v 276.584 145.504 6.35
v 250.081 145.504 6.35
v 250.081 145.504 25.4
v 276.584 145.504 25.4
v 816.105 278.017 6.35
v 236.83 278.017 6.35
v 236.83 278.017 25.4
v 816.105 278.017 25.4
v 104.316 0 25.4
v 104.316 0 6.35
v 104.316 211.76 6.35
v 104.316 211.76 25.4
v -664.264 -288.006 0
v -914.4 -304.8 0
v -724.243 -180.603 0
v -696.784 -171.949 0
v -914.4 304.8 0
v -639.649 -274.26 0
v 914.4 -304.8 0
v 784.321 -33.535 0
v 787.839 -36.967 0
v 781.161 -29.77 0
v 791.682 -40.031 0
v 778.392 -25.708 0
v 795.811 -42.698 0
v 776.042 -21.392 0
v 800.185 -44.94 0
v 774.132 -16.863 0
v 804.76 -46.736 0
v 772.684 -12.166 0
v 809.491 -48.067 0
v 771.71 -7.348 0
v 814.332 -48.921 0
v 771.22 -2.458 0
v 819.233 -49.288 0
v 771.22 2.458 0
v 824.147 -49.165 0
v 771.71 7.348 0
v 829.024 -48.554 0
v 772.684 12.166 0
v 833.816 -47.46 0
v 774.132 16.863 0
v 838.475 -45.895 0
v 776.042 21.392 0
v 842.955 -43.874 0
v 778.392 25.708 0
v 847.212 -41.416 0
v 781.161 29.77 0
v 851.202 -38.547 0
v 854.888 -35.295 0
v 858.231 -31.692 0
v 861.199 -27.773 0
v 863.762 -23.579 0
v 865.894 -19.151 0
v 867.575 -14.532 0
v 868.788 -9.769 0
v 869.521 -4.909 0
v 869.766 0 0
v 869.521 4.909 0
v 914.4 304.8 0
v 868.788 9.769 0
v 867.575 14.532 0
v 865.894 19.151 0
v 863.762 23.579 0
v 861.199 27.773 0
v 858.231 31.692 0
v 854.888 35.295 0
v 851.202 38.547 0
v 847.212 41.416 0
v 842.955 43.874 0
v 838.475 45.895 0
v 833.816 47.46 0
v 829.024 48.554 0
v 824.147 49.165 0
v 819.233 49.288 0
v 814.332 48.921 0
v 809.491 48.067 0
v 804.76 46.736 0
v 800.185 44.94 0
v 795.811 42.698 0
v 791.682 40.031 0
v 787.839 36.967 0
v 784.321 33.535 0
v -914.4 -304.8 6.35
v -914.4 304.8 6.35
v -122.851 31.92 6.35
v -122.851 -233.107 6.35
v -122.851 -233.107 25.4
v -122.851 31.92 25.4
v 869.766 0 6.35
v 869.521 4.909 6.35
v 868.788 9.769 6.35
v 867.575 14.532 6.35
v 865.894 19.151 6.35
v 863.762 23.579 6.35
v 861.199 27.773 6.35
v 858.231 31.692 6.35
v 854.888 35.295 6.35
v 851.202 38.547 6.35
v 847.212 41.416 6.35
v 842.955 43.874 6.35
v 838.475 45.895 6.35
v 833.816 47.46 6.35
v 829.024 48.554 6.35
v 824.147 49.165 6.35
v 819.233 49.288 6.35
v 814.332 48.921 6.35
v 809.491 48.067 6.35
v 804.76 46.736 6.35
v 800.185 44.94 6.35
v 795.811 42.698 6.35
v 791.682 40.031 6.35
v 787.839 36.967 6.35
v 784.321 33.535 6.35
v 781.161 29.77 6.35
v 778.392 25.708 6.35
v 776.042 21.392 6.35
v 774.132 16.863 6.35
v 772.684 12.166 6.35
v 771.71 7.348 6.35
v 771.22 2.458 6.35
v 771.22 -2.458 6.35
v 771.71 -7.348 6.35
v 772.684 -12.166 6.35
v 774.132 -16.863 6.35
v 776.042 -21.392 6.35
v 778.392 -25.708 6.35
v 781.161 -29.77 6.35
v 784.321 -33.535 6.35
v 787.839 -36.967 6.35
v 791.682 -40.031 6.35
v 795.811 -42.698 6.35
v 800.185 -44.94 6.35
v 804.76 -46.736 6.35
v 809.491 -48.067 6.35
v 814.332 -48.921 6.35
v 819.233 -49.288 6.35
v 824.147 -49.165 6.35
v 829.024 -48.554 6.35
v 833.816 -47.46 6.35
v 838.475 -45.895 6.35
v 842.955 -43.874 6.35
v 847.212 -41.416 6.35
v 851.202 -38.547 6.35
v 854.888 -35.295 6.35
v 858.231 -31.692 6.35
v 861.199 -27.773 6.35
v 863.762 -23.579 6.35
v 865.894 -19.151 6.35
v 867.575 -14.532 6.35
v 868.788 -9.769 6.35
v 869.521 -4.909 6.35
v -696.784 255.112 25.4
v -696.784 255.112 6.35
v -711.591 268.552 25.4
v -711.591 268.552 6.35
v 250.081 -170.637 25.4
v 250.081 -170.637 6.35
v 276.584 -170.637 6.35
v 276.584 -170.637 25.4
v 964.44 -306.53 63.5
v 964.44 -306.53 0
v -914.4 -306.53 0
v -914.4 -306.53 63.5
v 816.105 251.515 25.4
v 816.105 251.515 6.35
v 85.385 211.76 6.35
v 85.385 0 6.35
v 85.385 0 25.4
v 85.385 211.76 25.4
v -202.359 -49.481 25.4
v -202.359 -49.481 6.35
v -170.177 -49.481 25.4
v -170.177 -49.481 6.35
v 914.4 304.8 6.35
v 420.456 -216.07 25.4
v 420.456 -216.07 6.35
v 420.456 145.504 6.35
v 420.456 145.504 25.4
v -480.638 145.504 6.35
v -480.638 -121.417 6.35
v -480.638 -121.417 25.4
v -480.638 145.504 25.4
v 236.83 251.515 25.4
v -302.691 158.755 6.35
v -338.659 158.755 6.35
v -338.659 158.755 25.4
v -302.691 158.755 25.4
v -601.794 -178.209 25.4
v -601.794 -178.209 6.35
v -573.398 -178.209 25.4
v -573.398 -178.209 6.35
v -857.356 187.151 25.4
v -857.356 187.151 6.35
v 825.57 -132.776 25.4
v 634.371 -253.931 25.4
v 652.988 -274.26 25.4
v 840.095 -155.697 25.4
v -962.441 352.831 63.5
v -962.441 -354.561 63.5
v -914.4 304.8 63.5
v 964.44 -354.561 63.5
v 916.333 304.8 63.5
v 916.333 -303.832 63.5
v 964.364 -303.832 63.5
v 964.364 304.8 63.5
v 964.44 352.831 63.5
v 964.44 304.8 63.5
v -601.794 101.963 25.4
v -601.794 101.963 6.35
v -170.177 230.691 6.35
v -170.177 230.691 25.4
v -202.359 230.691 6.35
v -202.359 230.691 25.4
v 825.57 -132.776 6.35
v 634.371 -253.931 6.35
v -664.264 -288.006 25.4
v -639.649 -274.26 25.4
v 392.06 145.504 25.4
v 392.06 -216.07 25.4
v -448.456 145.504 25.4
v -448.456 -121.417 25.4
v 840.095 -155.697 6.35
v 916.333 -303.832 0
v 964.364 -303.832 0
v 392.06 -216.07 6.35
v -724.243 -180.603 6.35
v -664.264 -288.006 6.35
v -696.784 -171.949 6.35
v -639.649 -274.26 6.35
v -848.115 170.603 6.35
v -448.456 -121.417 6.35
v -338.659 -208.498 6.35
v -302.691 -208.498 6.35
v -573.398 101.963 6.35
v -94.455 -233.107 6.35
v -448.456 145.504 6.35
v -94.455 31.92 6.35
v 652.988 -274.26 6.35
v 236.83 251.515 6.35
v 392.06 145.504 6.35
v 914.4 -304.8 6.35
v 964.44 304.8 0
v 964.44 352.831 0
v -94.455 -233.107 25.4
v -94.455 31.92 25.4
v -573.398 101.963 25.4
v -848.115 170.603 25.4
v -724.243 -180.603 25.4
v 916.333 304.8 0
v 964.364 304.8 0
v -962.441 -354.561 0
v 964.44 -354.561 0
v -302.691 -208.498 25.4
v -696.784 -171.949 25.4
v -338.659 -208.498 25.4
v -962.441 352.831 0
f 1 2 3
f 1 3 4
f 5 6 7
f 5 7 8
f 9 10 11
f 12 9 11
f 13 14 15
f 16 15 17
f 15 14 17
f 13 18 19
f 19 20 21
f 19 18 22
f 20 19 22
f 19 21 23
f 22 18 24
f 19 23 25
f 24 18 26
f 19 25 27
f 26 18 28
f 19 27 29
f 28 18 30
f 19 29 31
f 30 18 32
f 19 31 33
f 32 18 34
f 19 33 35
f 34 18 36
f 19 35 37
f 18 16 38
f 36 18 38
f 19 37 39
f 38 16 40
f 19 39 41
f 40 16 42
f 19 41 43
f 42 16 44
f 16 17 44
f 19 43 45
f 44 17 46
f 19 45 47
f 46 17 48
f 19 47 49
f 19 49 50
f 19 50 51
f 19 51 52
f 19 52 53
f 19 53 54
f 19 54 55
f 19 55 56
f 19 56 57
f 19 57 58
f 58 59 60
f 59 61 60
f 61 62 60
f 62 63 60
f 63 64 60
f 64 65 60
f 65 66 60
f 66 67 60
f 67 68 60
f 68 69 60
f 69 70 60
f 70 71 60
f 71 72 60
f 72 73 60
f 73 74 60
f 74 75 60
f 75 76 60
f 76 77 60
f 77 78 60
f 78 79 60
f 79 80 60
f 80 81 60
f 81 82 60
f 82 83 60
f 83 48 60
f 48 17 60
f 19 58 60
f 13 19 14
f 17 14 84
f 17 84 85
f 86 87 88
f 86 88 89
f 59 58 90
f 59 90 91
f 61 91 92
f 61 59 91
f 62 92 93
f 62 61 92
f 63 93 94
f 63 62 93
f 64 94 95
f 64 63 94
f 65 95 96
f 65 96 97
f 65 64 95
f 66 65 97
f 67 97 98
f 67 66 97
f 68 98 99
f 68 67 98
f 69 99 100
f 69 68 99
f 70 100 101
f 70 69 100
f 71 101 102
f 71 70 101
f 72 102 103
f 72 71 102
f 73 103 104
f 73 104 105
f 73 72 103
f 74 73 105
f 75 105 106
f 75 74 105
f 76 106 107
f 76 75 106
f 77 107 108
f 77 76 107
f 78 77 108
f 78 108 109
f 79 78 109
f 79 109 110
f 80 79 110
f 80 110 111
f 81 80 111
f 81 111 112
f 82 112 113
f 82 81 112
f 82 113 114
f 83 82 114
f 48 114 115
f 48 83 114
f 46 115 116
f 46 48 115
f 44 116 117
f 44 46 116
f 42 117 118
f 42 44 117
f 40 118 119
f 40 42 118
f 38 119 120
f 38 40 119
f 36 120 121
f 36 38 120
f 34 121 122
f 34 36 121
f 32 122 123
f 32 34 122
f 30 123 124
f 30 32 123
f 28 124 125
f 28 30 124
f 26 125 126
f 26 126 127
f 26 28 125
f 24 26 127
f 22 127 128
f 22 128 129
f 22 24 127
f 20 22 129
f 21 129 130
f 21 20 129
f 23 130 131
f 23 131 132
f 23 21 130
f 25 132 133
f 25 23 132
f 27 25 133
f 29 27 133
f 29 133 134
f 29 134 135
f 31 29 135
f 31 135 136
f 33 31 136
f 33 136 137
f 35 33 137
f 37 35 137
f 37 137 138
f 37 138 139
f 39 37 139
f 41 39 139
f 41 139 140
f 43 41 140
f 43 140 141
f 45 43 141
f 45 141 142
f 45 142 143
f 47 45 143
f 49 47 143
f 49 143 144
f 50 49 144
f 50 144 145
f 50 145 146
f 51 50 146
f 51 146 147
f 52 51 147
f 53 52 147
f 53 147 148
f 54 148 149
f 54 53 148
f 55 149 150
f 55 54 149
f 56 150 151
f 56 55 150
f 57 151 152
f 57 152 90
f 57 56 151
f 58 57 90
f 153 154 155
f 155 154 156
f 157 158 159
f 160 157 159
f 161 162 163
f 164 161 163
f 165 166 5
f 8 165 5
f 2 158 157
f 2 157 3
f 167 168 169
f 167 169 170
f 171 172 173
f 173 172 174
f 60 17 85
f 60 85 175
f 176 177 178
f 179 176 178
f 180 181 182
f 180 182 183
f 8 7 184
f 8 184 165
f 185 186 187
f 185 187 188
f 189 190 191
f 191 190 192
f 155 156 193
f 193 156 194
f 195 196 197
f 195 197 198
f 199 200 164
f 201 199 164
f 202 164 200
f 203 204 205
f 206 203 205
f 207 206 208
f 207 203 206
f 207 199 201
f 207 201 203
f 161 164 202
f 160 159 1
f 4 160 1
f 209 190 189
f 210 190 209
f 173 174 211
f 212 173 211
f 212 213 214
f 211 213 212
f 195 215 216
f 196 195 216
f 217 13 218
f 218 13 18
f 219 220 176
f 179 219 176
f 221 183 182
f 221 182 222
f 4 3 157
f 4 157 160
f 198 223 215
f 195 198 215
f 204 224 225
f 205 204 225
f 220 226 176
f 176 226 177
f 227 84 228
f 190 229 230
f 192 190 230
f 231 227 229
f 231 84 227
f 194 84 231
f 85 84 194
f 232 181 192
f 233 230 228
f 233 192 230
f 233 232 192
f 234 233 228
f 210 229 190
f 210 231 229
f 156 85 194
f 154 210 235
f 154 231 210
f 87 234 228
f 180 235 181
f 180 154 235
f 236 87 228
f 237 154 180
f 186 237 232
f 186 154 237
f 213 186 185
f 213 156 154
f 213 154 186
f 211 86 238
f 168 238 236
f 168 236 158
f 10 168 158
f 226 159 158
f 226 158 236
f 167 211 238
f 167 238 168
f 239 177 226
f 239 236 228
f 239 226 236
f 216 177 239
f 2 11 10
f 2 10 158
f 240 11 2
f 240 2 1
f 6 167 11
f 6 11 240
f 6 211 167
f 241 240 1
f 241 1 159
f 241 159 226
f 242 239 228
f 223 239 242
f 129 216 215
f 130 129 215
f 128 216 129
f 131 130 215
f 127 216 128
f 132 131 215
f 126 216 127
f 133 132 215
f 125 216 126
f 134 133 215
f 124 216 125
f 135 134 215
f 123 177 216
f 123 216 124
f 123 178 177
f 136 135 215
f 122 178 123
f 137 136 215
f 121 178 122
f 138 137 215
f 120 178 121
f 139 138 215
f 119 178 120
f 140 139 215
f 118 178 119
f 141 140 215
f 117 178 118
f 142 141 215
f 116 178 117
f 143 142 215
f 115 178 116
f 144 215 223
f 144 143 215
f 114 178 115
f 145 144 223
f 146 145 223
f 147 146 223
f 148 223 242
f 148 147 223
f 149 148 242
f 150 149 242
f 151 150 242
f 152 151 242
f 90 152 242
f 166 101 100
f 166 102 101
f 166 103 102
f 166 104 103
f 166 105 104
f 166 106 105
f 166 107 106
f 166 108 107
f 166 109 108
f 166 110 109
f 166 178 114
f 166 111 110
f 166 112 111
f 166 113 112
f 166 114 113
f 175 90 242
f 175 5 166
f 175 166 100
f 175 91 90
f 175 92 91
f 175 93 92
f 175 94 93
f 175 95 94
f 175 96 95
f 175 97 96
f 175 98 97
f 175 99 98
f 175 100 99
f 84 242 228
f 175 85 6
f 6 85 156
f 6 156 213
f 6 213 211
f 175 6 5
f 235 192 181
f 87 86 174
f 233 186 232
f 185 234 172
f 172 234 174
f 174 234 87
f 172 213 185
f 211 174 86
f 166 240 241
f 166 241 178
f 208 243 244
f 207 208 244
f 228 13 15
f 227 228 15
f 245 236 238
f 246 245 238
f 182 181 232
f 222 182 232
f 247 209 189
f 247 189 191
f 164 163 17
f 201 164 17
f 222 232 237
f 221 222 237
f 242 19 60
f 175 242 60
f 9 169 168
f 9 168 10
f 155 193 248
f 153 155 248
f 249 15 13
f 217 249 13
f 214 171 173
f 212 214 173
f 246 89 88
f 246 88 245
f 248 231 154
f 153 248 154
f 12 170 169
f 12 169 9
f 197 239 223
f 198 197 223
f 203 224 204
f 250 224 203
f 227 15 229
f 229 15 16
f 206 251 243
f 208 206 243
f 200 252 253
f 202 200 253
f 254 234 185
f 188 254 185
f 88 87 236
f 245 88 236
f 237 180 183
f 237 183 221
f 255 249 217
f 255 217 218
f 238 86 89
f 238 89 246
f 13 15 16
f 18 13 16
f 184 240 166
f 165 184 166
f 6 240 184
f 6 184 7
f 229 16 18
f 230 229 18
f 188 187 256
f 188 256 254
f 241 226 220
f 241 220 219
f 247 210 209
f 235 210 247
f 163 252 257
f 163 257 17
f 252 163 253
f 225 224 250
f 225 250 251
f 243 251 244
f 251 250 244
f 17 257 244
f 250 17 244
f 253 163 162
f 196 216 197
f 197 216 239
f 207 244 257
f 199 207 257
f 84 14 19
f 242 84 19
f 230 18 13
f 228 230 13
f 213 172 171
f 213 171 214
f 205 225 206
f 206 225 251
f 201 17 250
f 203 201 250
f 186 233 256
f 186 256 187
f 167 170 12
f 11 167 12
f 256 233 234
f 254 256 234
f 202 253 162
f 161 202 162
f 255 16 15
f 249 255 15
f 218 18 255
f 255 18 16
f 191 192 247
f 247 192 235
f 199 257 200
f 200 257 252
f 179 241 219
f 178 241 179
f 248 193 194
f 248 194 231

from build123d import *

# Parameters (mm, degrees)
F2_DEPTH = 25.4
F0_W     = 48.0314
F0_H     = 608.6317263126
F3_DEPTH = 63.5
F0_W_2   = 1828.8
F0_H_2   = 609.6
F0_W_3   = 28.3958315849
F0_H_3   = 280.1721617579
F0_H_4   = 265.0277093053
F0_W_4   = 35.9680652618
F0_H_5   = 367.2526776791
F0_W_5   = 26.5027880669
F0_H_6   = 316.140204668
F0_H_7   = 361.5735173225
F0_W_6   = 32.1819484234
F0_H_8   = 266.9207602739
F0_W_7   = 32.1819335222
F0_H_9   = 280.1721505821
F0_W_8   = 18.93055439
F0_H_10  = 211.7604613304
F0_R     = 49.3032271109
F0_W_9   = 579.2748481035
F0_H_11  = 26.5027880669
F4_DEPTH = 6.35
F5_DEPTH = 25.4
F7_DEPTH = 25.4
F8_DEPTH = 25.4


# Not quite as in the source:
# - the program builds the solid bodies; features that only make, move or delete a surface that nothing else refers to are left out


with BuildPart() as f2:
    # F0 (on Top) → F2 (new body)
    with BuildSketch(Plane.XY):
        Polygon((-724.242739406, -180.6030766776), (-664.2644405365, -288.006067276), (-639.6492631828, -274.2599280315), (-696.7837155241, -171.9494063374), align=None)
    extrude(amount=F2_DEPTH)


with BuildPart() as f3:
    # F0 (on Top) → F3 (new body)
    with BuildSketch(Plane.XY):
        Polygon((-914.4, -306.5295712601), (-914.4, -304.8), (-914.4, 304.8), (-962.4407291412, 304.8), (-962.4407291412, -306.5295712601), align=None)
        Polygon((964.4395112991, -306.5295712601), (-914.4, -306.5295712601), (-962.4407291412, -306.5295712601), (-962.4407291412, -354.5609712601), (964.4395112991, -354.5609712601), align=None)
        Polygon((-962.4407291412, 304.8), (-914.4, 304.8), (914.4, 304.8), (916.3329601288, 304.8), (964.3643601288, 304.8), (964.4395112991, 304.8), (964.4395112991, 352.8314), (-962.4407291412, 352.8314), align=None)
        with Locations((940.3486601288, 0.4841368437)):
            Rectangle(F0_W, F0_H)
    extrude(amount=F3_DEPTH)


with BuildPart() as f4:
    # F0 (on Top) → F4 (new body)
    with BuildSketch(Plane.XY):
        Rectangle(F0_W_2, F0_H_2)
        Polygon((-639.6492631828, -274.2599280315), (-664.2644405365, -288.006067276), (-724.242739406, -180.6030766776), (-696.7837155241, -171.9494063374), align=None, mode=Mode.SUBTRACT)
        with Locations((-587.59573102, -38.1228066981)):
            Rectangle(F0_W_3, F0_H_3, mode=Mode.SUBTRACT)
        with Locations((-108.6528003216, -100.5936227739)):
            Rectangle(F0_W_3, F0_H_4, mode=Mode.SUBTRACT)
        with Locations((-320.6749558449, -24.8714238405)):
            Rectangle(F0_W_4, F0_H_5, mode=Mode.SUBTRACT)
        Polygon((652.9883329754, -274.2599280315), (634.3713402748, -253.9310753345), (825.5698084831, -132.7755451202), (840.0946035245, -155.6974749573), align=None, mode=Mode.SUBTRACT)
        with Locations((263.332515955, -12.5665664673)):
            Rectangle(F0_W_5, F0_H_6, mode=Mode.SUBTRACT)
        with Locations((406.2581658363, -35.2832227945)):
            Rectangle(F0_W_3, F0_H_7, mode=Mode.SUBTRACT)
        with Locations((-464.5471423864, 12.0431557298)):
            Rectangle(F0_W_6, F0_H_8, mode=Mode.SUBTRACT)
        with Locations((-186.2680539489, 90.6049404293)):
            Rectangle(F0_W_7, F0_H_9, mode=Mode.SUBTRACT)
        Polygon((-857.3560714722, 187.1507465839), (-711.5908265114, 268.5521245003), (-696.7837155241, 255.1123515359), (-848.1149500553, 170.6026934488), align=None, mode=Mode.SUBTRACT)
        with Locations((94.8506072164, 105.8802306652)):
            Rectangle(F0_W_8, F0_H_10, mode=Mode.SUBTRACT)
        with Locations((820.462346077, 0)):
            Circle(F0_R, mode=Mode.SUBTRACT)
        with Locations((526.467166841, 264.7660076618)):
            Rectangle(F0_W_9, F0_H_11, mode=Mode.SUBTRACT)
    extrude(amount=F4_DEPTH)

    # F0 (on Top) → F5 (join)
    with BuildSketch(Plane.XY):
        with Locations((-587.59573102, -38.1228066981)):
            Rectangle(F0_W_3, F0_H_3)
        Polygon((-696.7837155241, 255.1123515359), (-711.5908265114, 268.5521245003), (-857.3560714722, 187.1507465839), (-848.1149500553, 170.6026934488), align=None)
        with Locations((-464.5471423864, 12.0431557298)):
            Rectangle(F0_W_6, F0_H_8)
        with Locations((-320.6749558449, -24.8714238405)):
            Rectangle(F0_W_4, F0_H_5)
        with Locations((-186.2680539489, 90.6049404293)):
            Rectangle(F0_W_7, F0_H_9)
        with Locations((-108.6528003216, -100.5936227739)):
            Rectangle(F0_W_3, F0_H_4)
        with Locations((94.8506072164, 105.8802306652)):
            Rectangle(F0_W_8, F0_H_10)
        with Locations((263.332515955, -12.5665664673)):
            Rectangle(F0_W_5, F0_H_6)
        with Locations((406.2581658363, -35.2832227945)):
            Rectangle(F0_W_3, F0_H_7)
    extrude(amount=F5_DEPTH)

    # F0 (on Top) → F7 (join)
    with BuildSketch(Plane.XY):
        with Locations((526.467166841, 264.7660076618)):
            Rectangle(F0_W_9, F0_H_11)
    extrude(amount=F7_DEPTH)

    # F0 (on Top) → F8 (join)
    with BuildSketch(Plane.XY):
        Polygon((825.5698084831, -132.7755451202), (634.3713402748, -253.9310753345), (652.9883329754, -274.2599280315), (840.0946035245, -155.6974749573), align=None)
    extrude(amount=F8_DEPTH)


solid = Compound([f2.part, f3.part, f4.part])
